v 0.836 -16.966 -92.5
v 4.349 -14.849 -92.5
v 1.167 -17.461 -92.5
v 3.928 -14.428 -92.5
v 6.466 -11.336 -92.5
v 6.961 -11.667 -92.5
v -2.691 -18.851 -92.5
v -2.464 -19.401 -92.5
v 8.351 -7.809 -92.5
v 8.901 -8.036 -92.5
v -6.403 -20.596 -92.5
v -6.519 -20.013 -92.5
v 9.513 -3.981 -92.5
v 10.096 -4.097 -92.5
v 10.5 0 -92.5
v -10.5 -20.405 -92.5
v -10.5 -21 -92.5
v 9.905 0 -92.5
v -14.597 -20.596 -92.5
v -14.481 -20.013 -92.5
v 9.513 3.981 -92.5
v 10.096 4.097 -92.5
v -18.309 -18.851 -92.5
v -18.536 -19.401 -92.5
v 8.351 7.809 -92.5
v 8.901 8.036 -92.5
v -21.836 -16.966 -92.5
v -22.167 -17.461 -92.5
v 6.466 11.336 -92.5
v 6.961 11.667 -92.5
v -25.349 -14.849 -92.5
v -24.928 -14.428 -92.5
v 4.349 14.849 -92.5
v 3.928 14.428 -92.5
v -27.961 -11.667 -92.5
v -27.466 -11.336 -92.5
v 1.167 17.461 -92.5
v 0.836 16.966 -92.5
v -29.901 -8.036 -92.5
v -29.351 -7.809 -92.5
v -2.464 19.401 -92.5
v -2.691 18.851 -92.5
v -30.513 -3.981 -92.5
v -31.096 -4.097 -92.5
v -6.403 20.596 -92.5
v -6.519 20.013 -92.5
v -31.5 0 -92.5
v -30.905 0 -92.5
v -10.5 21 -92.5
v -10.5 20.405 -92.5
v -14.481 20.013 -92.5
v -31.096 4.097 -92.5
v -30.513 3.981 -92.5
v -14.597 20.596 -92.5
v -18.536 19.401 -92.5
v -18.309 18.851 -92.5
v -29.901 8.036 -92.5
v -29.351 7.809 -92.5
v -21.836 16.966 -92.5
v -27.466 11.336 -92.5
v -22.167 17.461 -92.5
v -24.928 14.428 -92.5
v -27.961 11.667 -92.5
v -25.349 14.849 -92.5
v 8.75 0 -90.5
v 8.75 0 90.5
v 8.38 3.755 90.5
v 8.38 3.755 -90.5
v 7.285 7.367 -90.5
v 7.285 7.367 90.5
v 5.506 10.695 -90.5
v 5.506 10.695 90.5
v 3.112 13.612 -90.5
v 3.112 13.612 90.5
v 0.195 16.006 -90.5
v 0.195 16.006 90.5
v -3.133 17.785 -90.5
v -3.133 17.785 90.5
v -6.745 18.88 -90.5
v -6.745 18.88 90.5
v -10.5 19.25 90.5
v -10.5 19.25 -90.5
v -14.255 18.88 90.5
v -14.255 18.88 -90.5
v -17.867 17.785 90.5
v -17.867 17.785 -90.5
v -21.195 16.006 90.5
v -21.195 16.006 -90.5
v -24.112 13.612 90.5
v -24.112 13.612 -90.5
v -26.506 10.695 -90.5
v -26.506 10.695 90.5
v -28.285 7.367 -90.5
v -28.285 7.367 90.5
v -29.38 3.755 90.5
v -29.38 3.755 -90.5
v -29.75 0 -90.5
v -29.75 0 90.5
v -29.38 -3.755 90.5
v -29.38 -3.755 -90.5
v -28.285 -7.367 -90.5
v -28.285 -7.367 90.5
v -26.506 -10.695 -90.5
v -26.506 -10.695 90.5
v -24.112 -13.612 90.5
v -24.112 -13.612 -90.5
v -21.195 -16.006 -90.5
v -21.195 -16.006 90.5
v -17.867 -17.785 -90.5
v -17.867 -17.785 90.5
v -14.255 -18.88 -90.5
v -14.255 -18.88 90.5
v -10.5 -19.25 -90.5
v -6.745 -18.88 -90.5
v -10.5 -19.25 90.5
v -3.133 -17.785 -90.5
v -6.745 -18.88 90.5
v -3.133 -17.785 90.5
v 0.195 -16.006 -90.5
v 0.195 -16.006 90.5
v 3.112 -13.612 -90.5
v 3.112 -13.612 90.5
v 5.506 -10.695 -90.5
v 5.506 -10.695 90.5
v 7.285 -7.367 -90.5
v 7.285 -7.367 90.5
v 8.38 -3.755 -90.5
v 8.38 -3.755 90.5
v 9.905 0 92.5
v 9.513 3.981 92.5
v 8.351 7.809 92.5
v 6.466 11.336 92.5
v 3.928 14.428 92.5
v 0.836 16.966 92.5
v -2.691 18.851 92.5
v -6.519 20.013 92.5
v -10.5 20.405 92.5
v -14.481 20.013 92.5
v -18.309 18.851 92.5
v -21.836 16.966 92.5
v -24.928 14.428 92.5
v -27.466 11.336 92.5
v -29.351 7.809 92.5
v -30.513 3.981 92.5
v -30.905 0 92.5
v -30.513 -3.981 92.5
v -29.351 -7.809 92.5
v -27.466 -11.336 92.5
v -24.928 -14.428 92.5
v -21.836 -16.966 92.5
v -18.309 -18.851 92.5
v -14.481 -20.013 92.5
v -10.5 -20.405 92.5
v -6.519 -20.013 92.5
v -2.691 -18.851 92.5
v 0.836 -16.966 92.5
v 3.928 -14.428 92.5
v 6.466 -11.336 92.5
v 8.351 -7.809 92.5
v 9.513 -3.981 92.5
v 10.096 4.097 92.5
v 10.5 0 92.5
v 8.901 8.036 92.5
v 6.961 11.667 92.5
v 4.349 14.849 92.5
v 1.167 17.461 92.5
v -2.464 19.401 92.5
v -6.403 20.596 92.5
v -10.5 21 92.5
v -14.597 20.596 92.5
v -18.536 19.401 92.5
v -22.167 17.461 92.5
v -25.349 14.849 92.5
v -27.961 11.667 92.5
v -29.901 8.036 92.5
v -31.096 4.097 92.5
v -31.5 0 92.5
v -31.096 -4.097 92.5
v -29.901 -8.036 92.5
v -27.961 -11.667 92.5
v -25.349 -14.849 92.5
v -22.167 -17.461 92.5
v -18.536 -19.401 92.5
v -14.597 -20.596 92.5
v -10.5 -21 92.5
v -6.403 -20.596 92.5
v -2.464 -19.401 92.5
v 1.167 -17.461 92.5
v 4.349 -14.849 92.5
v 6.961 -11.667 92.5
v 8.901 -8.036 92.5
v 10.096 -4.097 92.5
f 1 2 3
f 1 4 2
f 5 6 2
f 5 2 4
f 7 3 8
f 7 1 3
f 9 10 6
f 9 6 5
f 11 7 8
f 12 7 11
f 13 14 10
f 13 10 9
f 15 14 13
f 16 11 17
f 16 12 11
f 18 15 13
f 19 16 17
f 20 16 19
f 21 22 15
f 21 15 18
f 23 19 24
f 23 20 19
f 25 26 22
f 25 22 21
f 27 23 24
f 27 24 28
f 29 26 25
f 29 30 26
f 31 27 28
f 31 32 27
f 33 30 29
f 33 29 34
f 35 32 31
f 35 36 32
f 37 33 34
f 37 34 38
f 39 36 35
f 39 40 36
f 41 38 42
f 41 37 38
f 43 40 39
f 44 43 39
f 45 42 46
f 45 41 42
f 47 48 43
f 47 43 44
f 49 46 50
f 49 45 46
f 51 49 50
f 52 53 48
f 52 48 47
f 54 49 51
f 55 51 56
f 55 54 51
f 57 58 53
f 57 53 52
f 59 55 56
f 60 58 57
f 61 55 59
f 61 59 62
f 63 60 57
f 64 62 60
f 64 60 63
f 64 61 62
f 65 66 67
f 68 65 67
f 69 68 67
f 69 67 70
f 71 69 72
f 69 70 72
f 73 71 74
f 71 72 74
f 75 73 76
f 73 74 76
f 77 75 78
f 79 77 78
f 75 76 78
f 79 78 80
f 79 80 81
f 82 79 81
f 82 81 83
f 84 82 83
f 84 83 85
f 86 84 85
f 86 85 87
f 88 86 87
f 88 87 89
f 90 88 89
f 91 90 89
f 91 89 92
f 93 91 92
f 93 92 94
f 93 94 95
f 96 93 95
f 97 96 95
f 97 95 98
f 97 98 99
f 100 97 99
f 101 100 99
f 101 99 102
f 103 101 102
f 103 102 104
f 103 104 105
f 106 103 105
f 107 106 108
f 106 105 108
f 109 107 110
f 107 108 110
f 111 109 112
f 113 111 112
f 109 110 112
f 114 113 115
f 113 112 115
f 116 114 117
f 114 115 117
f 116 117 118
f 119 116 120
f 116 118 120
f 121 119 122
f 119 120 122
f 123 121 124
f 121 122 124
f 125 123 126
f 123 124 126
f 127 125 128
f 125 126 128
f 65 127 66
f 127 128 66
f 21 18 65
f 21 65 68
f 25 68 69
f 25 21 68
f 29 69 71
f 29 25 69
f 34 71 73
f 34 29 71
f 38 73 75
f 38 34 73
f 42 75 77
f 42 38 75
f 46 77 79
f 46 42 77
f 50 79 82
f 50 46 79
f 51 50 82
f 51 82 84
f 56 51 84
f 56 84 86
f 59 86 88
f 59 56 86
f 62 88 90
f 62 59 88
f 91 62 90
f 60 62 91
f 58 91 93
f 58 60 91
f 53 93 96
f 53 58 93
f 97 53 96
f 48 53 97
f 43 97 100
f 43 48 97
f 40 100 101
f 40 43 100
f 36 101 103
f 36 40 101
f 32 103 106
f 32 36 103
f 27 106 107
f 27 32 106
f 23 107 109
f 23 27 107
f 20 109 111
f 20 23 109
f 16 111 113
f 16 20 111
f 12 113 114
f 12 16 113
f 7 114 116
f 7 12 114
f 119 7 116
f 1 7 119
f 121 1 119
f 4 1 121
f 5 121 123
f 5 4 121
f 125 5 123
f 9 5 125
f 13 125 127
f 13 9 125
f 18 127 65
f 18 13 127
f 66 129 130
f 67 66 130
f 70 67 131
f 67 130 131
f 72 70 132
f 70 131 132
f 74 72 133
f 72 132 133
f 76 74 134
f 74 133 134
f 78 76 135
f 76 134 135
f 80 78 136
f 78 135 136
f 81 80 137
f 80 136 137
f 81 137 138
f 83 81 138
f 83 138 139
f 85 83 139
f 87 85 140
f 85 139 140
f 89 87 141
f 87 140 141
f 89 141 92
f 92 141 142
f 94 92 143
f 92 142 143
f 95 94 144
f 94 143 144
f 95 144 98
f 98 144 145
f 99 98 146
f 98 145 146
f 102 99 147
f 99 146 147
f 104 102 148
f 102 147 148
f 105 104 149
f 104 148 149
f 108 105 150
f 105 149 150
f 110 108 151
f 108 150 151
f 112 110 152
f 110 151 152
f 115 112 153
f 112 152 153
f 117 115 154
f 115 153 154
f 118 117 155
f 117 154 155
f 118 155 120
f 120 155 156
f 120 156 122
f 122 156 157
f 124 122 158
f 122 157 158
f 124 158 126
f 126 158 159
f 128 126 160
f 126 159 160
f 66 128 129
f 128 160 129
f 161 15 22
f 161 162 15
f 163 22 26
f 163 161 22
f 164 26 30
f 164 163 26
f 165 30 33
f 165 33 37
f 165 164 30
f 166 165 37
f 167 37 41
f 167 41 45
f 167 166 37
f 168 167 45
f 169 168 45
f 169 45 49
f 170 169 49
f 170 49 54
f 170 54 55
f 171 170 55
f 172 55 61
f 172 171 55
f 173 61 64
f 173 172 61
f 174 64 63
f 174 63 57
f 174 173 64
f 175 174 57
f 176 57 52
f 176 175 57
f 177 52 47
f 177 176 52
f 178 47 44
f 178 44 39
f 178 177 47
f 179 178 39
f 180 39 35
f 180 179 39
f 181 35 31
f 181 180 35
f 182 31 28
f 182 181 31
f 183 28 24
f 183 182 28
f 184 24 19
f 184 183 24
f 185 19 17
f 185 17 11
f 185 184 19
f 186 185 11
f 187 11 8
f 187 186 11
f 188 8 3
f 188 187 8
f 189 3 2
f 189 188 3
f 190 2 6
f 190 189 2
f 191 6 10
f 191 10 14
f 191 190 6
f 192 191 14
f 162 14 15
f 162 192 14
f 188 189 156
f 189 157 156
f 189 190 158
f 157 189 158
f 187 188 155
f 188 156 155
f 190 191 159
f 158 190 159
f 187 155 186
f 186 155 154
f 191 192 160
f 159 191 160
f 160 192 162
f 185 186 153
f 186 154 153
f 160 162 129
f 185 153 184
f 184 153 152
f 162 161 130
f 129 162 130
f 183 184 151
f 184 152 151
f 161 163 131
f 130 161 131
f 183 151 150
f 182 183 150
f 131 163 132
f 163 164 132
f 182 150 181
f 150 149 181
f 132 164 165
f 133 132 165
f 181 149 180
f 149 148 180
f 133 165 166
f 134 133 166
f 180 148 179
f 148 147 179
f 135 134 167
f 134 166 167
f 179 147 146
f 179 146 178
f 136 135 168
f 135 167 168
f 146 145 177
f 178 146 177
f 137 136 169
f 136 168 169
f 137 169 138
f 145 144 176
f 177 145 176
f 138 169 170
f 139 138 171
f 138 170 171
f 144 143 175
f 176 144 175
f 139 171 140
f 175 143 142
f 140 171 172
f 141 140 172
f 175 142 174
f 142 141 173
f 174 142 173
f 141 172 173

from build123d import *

# Parameters (mm, degrees)
F0_W     = 21
F0_H     = 185
F2_R     = 19.25
F3_DEPTH = 185.001
F4_SIZE2 = 1.1547005384
F4_SIZE  = 2


with BuildPart() as f1:
    # F0 (on Front) → F1 (revolve)
    with BuildSketch(Plane.XZ):
        Rectangle(F0_W, F0_H)
    revolve(axis=Axis((-10.5, 0, 0), (0, 0, 1)))

    # F2 (on face) → F3 (cut, through all)
    with BuildSketch(Plane.XY.offset(92.5)):
        with Locations((-10.5, 0)):
            Circle(F2_R)
    extrude(amount=-F3_DEPTH, mode=Mode.SUBTRACT)

    # F4
    f4_edges = [f1.edges().sort_by_distance(p)[0] for p in [
        (-29.75, 0, 92.5),
        (-29.75, 0, -92.5),
    ]]
    f4_side = f1.faces().sort_by_distance((-29.75, 0, 0))[0]
    chamfer(f4_edges, length=F4_SIZE, length2=F4_SIZE2, reference=f4_side)


solid = f1.part
